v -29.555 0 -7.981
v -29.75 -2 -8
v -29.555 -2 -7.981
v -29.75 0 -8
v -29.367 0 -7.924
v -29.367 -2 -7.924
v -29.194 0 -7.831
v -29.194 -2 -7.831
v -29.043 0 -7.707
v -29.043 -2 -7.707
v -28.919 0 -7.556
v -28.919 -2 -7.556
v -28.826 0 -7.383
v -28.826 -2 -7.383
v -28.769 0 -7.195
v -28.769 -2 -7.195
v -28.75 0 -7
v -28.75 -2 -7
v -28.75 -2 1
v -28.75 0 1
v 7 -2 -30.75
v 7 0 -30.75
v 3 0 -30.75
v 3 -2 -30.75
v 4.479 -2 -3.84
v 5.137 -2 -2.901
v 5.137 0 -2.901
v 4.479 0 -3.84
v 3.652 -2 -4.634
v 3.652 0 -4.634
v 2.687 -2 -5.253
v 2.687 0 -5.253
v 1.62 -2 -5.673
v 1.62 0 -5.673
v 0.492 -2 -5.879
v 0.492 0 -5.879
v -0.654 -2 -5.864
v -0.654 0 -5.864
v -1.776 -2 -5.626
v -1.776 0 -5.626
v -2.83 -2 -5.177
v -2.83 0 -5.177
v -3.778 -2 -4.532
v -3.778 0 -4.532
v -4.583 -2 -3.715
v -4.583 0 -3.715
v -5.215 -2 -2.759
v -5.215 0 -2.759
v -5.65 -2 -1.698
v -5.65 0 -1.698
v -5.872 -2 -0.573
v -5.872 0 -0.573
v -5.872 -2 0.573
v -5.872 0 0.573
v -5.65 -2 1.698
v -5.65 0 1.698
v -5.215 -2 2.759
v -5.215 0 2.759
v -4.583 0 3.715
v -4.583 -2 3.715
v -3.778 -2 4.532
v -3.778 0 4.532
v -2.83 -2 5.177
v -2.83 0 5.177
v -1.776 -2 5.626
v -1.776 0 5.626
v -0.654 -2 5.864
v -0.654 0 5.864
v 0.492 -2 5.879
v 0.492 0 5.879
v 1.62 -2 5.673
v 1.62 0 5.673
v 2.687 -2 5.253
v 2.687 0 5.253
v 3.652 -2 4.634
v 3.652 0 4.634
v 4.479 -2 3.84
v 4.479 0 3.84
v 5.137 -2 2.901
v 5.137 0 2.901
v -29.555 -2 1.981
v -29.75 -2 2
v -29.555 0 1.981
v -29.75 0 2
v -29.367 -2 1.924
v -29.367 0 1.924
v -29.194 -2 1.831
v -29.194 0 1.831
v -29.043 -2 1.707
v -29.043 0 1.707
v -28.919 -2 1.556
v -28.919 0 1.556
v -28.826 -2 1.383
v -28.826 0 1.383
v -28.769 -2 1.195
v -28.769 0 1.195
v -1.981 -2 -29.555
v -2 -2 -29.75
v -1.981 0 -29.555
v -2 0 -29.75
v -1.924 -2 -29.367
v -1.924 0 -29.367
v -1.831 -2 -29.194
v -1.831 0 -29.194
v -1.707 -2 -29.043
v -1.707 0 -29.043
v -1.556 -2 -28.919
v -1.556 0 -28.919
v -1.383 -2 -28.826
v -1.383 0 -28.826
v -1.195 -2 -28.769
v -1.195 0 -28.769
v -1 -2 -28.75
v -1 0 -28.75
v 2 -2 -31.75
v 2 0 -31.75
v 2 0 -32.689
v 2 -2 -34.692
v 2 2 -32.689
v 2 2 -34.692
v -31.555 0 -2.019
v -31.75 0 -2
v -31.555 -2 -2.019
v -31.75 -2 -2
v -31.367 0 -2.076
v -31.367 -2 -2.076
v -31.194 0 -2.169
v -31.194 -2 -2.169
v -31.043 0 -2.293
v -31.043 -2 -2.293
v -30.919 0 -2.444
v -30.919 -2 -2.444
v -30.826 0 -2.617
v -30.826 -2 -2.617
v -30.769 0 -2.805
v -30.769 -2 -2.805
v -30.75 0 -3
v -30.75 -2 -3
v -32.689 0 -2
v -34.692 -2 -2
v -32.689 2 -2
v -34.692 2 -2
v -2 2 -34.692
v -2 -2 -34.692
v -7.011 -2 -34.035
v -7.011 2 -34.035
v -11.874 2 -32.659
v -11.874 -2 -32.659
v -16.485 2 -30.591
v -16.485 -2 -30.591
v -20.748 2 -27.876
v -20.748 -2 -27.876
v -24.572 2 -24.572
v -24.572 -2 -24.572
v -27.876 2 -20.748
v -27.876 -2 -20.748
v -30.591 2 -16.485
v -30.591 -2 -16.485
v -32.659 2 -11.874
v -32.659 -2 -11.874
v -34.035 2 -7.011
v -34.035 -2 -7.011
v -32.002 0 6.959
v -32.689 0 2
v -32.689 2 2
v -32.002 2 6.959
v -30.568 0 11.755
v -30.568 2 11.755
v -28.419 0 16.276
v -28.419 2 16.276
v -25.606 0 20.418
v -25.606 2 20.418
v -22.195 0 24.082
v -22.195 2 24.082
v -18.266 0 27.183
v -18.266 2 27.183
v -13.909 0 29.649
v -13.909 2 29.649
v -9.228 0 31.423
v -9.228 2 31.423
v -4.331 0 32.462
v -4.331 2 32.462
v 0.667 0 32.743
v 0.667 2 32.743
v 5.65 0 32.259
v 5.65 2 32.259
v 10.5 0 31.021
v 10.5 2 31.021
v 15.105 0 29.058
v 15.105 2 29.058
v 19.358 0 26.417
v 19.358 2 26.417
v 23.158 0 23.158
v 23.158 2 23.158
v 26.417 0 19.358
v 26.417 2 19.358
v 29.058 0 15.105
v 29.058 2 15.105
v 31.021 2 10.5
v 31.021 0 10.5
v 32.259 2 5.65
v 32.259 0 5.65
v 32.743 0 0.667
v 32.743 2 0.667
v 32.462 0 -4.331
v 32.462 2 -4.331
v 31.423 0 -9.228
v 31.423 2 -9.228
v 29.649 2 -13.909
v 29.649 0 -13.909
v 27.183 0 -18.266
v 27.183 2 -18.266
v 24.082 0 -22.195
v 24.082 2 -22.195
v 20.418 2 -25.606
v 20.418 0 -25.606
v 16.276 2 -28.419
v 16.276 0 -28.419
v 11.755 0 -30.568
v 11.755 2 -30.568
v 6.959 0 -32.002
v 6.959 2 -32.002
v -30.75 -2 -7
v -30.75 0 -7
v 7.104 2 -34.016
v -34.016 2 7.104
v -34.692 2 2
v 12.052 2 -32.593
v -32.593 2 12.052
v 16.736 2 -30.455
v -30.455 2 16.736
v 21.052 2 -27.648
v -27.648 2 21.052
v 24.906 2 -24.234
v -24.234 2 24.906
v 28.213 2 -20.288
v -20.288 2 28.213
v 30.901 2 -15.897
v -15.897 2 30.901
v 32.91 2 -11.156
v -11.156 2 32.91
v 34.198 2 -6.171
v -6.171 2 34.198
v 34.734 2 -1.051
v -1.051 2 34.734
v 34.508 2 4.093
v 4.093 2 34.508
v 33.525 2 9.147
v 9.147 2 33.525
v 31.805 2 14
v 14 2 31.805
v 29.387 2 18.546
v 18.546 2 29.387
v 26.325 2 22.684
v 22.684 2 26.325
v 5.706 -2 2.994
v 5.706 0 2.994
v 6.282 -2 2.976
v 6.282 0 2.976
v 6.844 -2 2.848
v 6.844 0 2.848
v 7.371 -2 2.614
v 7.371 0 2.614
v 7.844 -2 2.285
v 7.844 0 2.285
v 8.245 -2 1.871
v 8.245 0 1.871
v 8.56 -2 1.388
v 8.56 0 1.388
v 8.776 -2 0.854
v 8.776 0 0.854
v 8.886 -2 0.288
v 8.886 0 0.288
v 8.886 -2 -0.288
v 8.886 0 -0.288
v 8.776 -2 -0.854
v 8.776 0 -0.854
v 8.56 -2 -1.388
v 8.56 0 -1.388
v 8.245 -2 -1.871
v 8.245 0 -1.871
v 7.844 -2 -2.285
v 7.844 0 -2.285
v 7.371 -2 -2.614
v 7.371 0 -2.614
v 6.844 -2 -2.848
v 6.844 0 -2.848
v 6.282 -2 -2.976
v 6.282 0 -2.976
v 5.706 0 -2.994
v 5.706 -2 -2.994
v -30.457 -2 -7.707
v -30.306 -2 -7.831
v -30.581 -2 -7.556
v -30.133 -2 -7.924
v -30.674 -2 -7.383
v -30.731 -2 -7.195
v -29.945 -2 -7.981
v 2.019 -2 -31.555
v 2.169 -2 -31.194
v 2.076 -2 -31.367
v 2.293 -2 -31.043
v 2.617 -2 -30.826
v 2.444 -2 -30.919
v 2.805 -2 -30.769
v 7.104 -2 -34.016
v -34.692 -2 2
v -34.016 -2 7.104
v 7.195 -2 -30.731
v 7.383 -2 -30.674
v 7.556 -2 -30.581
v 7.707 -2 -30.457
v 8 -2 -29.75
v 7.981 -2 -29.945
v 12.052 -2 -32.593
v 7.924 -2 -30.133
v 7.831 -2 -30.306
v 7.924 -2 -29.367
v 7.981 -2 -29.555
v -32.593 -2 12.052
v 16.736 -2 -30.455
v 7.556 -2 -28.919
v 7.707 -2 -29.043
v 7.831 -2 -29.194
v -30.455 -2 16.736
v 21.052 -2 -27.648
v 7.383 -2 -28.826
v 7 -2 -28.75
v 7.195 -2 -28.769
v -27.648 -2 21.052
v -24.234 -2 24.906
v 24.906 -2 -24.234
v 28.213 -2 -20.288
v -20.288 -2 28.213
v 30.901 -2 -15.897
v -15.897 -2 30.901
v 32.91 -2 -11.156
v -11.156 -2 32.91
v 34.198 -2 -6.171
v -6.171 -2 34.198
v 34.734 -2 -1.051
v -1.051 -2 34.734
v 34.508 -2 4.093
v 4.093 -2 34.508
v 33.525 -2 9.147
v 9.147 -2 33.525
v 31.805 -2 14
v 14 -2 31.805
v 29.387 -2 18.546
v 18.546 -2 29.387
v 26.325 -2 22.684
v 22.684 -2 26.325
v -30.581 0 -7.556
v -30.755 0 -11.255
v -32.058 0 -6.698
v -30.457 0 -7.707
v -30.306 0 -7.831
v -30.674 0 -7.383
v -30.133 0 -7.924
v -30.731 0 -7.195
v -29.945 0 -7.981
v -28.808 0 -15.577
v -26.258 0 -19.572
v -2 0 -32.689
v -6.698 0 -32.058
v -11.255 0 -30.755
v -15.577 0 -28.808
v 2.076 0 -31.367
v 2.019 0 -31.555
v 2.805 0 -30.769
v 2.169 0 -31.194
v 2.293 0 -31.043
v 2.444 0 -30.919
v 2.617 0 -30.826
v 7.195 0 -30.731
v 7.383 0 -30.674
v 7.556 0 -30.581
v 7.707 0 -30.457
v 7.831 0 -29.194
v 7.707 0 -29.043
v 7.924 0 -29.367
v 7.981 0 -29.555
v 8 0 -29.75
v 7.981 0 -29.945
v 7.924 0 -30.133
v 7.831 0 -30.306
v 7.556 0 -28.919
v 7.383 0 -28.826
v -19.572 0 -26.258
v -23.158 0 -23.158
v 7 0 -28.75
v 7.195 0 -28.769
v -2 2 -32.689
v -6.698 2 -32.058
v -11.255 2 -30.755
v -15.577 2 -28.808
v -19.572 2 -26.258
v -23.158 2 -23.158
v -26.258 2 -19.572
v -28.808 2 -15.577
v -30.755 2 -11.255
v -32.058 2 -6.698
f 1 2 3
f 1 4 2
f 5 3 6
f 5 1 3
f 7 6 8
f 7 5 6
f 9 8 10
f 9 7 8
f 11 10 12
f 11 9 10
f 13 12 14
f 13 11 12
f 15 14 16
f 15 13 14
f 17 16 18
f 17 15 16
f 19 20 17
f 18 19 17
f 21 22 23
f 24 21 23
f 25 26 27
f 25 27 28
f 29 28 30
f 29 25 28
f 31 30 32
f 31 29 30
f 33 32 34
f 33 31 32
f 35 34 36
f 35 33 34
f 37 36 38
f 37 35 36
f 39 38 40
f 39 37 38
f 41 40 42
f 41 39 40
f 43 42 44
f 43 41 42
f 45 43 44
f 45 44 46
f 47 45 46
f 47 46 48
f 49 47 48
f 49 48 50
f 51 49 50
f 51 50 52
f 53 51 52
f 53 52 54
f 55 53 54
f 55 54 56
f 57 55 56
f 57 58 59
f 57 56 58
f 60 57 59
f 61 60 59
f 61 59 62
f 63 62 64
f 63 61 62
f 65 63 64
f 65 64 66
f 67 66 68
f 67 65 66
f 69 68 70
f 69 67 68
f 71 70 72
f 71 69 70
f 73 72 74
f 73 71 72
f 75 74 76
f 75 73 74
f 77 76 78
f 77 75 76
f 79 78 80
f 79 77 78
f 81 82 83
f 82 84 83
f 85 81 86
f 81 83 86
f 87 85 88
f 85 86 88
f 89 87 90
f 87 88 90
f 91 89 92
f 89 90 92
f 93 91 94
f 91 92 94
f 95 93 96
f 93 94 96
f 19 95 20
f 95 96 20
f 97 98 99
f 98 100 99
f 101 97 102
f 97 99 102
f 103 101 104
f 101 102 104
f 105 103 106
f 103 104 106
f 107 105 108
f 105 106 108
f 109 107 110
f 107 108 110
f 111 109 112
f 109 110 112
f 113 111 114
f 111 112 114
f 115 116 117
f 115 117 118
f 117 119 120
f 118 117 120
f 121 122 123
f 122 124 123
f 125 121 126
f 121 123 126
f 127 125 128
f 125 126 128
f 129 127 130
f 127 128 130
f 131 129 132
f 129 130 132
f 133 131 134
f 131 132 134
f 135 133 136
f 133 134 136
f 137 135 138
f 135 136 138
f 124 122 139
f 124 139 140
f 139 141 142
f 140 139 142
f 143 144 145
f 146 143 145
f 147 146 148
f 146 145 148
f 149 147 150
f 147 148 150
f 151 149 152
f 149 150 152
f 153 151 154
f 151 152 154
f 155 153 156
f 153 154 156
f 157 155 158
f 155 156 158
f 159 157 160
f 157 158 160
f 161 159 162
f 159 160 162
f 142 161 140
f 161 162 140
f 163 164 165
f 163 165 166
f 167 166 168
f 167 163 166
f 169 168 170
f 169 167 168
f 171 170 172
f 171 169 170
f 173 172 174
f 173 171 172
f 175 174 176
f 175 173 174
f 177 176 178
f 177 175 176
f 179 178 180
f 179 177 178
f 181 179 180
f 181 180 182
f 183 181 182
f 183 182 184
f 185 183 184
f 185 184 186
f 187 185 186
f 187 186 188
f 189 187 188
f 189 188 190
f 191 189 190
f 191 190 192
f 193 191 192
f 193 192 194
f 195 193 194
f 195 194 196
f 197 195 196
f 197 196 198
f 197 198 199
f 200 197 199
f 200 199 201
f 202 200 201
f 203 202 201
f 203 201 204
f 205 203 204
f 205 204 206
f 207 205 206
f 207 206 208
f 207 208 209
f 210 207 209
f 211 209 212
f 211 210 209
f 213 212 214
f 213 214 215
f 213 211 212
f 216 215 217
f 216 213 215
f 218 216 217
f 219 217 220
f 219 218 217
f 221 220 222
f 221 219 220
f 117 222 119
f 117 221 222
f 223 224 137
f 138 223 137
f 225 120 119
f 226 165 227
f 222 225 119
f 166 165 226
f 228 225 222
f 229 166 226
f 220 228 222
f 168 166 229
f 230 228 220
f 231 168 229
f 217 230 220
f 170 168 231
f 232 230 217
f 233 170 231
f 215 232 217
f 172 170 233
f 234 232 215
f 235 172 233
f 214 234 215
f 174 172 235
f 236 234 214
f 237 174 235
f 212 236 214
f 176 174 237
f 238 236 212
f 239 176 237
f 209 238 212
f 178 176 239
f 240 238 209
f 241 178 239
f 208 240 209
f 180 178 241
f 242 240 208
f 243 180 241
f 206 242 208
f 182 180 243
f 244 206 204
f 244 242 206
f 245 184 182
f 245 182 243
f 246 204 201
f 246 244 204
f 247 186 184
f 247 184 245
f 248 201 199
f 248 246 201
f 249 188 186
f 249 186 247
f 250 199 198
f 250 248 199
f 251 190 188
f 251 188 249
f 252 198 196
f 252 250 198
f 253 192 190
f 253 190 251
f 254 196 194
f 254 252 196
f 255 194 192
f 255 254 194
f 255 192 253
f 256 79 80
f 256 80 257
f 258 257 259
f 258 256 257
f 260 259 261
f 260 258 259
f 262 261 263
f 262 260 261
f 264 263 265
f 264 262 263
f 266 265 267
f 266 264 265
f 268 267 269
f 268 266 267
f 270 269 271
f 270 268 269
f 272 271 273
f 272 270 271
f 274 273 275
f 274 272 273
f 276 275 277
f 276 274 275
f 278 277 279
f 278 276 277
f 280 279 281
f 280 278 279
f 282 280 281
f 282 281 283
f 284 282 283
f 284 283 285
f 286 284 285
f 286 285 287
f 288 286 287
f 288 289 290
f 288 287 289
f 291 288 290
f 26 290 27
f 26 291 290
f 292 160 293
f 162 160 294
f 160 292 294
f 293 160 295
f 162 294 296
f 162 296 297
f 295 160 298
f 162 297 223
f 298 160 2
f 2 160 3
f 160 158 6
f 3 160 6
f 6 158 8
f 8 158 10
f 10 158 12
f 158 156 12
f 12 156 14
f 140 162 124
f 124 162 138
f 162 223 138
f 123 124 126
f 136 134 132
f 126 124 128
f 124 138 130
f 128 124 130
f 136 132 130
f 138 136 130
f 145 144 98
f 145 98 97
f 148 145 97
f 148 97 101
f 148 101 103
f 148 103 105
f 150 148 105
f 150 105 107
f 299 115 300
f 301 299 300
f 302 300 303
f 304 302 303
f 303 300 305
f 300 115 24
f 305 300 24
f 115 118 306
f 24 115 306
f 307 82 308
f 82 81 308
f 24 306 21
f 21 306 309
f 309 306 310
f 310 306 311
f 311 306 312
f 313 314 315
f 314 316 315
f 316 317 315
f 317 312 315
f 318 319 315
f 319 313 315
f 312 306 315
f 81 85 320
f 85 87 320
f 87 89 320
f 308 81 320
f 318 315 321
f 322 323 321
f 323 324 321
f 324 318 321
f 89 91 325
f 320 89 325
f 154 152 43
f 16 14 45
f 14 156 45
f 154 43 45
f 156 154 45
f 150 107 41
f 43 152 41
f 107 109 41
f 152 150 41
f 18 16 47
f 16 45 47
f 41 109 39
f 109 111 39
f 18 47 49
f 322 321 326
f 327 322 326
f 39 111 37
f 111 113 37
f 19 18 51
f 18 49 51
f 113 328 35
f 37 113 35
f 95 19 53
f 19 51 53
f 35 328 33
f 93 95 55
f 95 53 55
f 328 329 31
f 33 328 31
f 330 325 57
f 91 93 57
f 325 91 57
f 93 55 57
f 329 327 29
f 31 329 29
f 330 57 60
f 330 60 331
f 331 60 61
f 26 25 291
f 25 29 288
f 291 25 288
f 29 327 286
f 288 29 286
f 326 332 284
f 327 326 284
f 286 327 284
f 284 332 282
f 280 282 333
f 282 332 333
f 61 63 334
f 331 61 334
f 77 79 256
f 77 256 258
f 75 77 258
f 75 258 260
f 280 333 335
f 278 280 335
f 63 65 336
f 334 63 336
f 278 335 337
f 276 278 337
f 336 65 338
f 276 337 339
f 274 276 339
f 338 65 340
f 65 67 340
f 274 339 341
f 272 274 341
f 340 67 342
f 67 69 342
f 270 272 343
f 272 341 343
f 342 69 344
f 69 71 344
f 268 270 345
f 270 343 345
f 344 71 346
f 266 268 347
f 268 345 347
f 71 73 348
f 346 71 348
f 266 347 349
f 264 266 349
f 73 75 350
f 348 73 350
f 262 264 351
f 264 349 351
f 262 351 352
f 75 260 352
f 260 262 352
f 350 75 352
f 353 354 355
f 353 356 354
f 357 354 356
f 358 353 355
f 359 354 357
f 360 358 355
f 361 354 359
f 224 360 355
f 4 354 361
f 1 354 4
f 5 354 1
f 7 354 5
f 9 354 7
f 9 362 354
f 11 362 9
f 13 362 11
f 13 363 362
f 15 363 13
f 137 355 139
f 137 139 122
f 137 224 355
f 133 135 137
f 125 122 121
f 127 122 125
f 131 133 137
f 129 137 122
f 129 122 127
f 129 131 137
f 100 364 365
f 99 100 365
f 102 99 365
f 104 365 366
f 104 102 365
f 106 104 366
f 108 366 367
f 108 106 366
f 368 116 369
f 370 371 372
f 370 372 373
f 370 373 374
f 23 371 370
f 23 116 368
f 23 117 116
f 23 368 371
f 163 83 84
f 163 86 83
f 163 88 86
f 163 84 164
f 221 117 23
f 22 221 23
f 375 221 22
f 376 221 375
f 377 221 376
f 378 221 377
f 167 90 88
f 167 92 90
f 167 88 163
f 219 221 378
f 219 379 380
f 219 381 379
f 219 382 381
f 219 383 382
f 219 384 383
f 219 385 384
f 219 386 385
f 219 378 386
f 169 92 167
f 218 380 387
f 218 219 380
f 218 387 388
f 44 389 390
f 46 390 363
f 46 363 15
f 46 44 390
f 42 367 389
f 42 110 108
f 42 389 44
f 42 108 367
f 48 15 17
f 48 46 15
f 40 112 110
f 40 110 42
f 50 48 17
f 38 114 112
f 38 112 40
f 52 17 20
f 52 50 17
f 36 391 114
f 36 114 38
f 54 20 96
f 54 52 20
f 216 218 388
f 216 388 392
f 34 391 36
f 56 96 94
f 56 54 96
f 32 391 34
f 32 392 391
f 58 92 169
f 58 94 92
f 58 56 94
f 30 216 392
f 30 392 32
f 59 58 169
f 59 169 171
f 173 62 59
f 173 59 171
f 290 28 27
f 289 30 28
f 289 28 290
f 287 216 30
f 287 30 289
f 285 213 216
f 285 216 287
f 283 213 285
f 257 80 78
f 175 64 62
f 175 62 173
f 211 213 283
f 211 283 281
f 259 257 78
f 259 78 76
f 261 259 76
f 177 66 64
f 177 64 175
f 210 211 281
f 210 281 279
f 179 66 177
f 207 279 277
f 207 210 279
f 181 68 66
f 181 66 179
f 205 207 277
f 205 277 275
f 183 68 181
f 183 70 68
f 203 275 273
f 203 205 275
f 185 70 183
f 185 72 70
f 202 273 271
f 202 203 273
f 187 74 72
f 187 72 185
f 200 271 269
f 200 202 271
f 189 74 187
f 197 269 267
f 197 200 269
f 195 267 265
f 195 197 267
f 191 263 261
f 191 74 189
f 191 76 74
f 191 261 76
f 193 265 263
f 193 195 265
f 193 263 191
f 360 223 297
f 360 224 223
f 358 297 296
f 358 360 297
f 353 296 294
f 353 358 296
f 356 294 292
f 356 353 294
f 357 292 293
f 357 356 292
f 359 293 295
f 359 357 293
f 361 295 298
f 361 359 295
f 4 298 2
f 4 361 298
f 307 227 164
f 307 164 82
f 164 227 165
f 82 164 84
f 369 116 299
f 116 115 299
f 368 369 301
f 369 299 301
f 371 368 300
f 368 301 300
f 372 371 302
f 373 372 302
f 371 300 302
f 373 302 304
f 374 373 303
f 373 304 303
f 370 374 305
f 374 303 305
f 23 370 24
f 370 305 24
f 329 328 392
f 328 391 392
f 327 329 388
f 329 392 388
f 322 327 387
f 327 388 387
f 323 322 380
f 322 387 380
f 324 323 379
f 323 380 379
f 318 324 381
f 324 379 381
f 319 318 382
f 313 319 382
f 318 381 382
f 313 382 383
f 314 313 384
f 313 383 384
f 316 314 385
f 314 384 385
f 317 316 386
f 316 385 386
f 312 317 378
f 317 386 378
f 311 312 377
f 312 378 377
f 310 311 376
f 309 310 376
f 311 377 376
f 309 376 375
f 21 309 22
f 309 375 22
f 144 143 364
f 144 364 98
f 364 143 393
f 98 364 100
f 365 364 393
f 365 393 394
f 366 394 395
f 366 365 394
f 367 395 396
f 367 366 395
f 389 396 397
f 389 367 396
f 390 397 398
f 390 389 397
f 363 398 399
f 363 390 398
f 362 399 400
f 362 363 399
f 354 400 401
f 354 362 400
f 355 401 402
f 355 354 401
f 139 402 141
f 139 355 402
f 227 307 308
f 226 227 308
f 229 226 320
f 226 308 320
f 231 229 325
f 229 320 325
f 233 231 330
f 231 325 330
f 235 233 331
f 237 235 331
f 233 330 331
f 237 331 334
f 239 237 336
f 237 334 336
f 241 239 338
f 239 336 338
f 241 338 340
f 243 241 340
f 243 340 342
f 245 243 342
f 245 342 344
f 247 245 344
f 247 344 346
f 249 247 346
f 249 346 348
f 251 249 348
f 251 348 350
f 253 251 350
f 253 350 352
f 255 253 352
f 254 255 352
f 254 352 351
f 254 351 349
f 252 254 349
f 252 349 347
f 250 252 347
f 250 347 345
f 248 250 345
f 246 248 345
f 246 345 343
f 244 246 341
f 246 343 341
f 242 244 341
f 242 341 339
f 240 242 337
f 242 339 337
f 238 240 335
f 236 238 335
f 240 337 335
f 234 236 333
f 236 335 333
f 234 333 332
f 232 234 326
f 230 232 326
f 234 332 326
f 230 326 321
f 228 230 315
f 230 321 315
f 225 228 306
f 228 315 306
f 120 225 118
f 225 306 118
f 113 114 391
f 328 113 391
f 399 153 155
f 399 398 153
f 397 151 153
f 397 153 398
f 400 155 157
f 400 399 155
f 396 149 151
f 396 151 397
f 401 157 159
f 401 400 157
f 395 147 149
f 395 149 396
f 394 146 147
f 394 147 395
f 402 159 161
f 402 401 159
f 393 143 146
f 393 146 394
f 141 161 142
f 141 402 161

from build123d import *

# Parameters (mm, degrees)
SKETCH1_R                     = 32.75
OUTER_DISK_DEPTH              = 2
ENCLOSEMENT_T                 = 2
HOOK_RELEASE_DEPTH            = 50.184601249
CIRPATTERN1_COUNT             = 2
CIRPATTERN1_ANGLE             = 90
SERVO_MOTOR_CUTOUT_DEPTH      = 50.184601249
SERVO_MOTOR_CUTOUT_DEPTH_BACK = 50.184601249
SKETCH3_R                     = 3
SKETCH3_R_2                   = 5.9
FILLET1_R                     = 1


with BuildPart() as part:
    # Sketch1 → Outer DIsk (new body)
    with BuildSketch(Plane(origin=(0, 0, 0), x_dir=(1, 0, 0), z_dir=(0, 1, 0))):
        with Locations(Location((0, 0, 0), (0, 0, 270))):
            Circle(SKETCH1_R)
    extrude(amount=OUTER_DISK_DEPTH)

    # Enclosement
    enclosement_openings = [part.faces().sort_by_distance(p)[0] for p in [
        (0, 2, 0),
    ]]
    offset(amount=ENCLOSEMENT_T, openings=enclosement_openings, kind=Kind.INTERSECTION)

    # Sketch2 → Hook Release (cut, symmetric)
    with BuildSketch(Plane(origin=(0, 0, 0), x_dir=(1, 0, 0), z_dir=(0, 1, 0))):
        Polygon((-2, 34.75), (-2, 28.75), (8, 28.75), (8, 30.75), (2, 30.75), (2, 34.75), align=None)
    hook_release = extrude(amount=HOOK_RELEASE_DEPTH, both=True, mode=Mode.SUBTRACT)

    # CirPattern1: Hook Release ×2 about axis
    cirpattern1_axis = Axis((0, 0, 0), (0, 1, 0))
    for i in range(1, CIRPATTERN1_COUNT):
        add(hook_release.rotate(cirpattern1_axis, i * CIRPATTERN1_ANGLE / (CIRPATTERN1_COUNT - 1)), mode=Mode.SUBTRACT)

    # Sketch3 → Servo Motor Cutout (cut, two sides: drawn at the far end of the back side and taken through both)
    with BuildSketch(Plane(origin=(0, 0, 0), x_dir=(1, 0, 0), z_dir=(0, 1, 0)).offset(-SERVO_MOTOR_CUTOUT_DEPTH_BACK)):
        with Locations((5.9, 0)):
            Circle(SKETCH3_R)
        Circle(SKETCH3_R_2)
    extrude(amount=SERVO_MOTOR_CUTOUT_DEPTH + SERVO_MOTOR_CUTOUT_DEPTH_BACK, mode=Mode.SUBTRACT)

    # Fillet1
    fillet1_edges = [part.edges().sort_by_distance(p)[0] for p in [
        (-28.75, -1, 2),
        (-28.75, -1, -8),
        (-30.75, -1, -8),
        (-30.75, -1, -2),
        (8, -1, -28.75),
        (-2, -1, -28.75),
        (8, -1, -30.75),
        (2, -1, -30.75),
    ]]
    fillet(fillet1_edges, radius=FILLET1_R - 0.0001)  # a hair under: the kernel refuses the full size


solid = part.part
